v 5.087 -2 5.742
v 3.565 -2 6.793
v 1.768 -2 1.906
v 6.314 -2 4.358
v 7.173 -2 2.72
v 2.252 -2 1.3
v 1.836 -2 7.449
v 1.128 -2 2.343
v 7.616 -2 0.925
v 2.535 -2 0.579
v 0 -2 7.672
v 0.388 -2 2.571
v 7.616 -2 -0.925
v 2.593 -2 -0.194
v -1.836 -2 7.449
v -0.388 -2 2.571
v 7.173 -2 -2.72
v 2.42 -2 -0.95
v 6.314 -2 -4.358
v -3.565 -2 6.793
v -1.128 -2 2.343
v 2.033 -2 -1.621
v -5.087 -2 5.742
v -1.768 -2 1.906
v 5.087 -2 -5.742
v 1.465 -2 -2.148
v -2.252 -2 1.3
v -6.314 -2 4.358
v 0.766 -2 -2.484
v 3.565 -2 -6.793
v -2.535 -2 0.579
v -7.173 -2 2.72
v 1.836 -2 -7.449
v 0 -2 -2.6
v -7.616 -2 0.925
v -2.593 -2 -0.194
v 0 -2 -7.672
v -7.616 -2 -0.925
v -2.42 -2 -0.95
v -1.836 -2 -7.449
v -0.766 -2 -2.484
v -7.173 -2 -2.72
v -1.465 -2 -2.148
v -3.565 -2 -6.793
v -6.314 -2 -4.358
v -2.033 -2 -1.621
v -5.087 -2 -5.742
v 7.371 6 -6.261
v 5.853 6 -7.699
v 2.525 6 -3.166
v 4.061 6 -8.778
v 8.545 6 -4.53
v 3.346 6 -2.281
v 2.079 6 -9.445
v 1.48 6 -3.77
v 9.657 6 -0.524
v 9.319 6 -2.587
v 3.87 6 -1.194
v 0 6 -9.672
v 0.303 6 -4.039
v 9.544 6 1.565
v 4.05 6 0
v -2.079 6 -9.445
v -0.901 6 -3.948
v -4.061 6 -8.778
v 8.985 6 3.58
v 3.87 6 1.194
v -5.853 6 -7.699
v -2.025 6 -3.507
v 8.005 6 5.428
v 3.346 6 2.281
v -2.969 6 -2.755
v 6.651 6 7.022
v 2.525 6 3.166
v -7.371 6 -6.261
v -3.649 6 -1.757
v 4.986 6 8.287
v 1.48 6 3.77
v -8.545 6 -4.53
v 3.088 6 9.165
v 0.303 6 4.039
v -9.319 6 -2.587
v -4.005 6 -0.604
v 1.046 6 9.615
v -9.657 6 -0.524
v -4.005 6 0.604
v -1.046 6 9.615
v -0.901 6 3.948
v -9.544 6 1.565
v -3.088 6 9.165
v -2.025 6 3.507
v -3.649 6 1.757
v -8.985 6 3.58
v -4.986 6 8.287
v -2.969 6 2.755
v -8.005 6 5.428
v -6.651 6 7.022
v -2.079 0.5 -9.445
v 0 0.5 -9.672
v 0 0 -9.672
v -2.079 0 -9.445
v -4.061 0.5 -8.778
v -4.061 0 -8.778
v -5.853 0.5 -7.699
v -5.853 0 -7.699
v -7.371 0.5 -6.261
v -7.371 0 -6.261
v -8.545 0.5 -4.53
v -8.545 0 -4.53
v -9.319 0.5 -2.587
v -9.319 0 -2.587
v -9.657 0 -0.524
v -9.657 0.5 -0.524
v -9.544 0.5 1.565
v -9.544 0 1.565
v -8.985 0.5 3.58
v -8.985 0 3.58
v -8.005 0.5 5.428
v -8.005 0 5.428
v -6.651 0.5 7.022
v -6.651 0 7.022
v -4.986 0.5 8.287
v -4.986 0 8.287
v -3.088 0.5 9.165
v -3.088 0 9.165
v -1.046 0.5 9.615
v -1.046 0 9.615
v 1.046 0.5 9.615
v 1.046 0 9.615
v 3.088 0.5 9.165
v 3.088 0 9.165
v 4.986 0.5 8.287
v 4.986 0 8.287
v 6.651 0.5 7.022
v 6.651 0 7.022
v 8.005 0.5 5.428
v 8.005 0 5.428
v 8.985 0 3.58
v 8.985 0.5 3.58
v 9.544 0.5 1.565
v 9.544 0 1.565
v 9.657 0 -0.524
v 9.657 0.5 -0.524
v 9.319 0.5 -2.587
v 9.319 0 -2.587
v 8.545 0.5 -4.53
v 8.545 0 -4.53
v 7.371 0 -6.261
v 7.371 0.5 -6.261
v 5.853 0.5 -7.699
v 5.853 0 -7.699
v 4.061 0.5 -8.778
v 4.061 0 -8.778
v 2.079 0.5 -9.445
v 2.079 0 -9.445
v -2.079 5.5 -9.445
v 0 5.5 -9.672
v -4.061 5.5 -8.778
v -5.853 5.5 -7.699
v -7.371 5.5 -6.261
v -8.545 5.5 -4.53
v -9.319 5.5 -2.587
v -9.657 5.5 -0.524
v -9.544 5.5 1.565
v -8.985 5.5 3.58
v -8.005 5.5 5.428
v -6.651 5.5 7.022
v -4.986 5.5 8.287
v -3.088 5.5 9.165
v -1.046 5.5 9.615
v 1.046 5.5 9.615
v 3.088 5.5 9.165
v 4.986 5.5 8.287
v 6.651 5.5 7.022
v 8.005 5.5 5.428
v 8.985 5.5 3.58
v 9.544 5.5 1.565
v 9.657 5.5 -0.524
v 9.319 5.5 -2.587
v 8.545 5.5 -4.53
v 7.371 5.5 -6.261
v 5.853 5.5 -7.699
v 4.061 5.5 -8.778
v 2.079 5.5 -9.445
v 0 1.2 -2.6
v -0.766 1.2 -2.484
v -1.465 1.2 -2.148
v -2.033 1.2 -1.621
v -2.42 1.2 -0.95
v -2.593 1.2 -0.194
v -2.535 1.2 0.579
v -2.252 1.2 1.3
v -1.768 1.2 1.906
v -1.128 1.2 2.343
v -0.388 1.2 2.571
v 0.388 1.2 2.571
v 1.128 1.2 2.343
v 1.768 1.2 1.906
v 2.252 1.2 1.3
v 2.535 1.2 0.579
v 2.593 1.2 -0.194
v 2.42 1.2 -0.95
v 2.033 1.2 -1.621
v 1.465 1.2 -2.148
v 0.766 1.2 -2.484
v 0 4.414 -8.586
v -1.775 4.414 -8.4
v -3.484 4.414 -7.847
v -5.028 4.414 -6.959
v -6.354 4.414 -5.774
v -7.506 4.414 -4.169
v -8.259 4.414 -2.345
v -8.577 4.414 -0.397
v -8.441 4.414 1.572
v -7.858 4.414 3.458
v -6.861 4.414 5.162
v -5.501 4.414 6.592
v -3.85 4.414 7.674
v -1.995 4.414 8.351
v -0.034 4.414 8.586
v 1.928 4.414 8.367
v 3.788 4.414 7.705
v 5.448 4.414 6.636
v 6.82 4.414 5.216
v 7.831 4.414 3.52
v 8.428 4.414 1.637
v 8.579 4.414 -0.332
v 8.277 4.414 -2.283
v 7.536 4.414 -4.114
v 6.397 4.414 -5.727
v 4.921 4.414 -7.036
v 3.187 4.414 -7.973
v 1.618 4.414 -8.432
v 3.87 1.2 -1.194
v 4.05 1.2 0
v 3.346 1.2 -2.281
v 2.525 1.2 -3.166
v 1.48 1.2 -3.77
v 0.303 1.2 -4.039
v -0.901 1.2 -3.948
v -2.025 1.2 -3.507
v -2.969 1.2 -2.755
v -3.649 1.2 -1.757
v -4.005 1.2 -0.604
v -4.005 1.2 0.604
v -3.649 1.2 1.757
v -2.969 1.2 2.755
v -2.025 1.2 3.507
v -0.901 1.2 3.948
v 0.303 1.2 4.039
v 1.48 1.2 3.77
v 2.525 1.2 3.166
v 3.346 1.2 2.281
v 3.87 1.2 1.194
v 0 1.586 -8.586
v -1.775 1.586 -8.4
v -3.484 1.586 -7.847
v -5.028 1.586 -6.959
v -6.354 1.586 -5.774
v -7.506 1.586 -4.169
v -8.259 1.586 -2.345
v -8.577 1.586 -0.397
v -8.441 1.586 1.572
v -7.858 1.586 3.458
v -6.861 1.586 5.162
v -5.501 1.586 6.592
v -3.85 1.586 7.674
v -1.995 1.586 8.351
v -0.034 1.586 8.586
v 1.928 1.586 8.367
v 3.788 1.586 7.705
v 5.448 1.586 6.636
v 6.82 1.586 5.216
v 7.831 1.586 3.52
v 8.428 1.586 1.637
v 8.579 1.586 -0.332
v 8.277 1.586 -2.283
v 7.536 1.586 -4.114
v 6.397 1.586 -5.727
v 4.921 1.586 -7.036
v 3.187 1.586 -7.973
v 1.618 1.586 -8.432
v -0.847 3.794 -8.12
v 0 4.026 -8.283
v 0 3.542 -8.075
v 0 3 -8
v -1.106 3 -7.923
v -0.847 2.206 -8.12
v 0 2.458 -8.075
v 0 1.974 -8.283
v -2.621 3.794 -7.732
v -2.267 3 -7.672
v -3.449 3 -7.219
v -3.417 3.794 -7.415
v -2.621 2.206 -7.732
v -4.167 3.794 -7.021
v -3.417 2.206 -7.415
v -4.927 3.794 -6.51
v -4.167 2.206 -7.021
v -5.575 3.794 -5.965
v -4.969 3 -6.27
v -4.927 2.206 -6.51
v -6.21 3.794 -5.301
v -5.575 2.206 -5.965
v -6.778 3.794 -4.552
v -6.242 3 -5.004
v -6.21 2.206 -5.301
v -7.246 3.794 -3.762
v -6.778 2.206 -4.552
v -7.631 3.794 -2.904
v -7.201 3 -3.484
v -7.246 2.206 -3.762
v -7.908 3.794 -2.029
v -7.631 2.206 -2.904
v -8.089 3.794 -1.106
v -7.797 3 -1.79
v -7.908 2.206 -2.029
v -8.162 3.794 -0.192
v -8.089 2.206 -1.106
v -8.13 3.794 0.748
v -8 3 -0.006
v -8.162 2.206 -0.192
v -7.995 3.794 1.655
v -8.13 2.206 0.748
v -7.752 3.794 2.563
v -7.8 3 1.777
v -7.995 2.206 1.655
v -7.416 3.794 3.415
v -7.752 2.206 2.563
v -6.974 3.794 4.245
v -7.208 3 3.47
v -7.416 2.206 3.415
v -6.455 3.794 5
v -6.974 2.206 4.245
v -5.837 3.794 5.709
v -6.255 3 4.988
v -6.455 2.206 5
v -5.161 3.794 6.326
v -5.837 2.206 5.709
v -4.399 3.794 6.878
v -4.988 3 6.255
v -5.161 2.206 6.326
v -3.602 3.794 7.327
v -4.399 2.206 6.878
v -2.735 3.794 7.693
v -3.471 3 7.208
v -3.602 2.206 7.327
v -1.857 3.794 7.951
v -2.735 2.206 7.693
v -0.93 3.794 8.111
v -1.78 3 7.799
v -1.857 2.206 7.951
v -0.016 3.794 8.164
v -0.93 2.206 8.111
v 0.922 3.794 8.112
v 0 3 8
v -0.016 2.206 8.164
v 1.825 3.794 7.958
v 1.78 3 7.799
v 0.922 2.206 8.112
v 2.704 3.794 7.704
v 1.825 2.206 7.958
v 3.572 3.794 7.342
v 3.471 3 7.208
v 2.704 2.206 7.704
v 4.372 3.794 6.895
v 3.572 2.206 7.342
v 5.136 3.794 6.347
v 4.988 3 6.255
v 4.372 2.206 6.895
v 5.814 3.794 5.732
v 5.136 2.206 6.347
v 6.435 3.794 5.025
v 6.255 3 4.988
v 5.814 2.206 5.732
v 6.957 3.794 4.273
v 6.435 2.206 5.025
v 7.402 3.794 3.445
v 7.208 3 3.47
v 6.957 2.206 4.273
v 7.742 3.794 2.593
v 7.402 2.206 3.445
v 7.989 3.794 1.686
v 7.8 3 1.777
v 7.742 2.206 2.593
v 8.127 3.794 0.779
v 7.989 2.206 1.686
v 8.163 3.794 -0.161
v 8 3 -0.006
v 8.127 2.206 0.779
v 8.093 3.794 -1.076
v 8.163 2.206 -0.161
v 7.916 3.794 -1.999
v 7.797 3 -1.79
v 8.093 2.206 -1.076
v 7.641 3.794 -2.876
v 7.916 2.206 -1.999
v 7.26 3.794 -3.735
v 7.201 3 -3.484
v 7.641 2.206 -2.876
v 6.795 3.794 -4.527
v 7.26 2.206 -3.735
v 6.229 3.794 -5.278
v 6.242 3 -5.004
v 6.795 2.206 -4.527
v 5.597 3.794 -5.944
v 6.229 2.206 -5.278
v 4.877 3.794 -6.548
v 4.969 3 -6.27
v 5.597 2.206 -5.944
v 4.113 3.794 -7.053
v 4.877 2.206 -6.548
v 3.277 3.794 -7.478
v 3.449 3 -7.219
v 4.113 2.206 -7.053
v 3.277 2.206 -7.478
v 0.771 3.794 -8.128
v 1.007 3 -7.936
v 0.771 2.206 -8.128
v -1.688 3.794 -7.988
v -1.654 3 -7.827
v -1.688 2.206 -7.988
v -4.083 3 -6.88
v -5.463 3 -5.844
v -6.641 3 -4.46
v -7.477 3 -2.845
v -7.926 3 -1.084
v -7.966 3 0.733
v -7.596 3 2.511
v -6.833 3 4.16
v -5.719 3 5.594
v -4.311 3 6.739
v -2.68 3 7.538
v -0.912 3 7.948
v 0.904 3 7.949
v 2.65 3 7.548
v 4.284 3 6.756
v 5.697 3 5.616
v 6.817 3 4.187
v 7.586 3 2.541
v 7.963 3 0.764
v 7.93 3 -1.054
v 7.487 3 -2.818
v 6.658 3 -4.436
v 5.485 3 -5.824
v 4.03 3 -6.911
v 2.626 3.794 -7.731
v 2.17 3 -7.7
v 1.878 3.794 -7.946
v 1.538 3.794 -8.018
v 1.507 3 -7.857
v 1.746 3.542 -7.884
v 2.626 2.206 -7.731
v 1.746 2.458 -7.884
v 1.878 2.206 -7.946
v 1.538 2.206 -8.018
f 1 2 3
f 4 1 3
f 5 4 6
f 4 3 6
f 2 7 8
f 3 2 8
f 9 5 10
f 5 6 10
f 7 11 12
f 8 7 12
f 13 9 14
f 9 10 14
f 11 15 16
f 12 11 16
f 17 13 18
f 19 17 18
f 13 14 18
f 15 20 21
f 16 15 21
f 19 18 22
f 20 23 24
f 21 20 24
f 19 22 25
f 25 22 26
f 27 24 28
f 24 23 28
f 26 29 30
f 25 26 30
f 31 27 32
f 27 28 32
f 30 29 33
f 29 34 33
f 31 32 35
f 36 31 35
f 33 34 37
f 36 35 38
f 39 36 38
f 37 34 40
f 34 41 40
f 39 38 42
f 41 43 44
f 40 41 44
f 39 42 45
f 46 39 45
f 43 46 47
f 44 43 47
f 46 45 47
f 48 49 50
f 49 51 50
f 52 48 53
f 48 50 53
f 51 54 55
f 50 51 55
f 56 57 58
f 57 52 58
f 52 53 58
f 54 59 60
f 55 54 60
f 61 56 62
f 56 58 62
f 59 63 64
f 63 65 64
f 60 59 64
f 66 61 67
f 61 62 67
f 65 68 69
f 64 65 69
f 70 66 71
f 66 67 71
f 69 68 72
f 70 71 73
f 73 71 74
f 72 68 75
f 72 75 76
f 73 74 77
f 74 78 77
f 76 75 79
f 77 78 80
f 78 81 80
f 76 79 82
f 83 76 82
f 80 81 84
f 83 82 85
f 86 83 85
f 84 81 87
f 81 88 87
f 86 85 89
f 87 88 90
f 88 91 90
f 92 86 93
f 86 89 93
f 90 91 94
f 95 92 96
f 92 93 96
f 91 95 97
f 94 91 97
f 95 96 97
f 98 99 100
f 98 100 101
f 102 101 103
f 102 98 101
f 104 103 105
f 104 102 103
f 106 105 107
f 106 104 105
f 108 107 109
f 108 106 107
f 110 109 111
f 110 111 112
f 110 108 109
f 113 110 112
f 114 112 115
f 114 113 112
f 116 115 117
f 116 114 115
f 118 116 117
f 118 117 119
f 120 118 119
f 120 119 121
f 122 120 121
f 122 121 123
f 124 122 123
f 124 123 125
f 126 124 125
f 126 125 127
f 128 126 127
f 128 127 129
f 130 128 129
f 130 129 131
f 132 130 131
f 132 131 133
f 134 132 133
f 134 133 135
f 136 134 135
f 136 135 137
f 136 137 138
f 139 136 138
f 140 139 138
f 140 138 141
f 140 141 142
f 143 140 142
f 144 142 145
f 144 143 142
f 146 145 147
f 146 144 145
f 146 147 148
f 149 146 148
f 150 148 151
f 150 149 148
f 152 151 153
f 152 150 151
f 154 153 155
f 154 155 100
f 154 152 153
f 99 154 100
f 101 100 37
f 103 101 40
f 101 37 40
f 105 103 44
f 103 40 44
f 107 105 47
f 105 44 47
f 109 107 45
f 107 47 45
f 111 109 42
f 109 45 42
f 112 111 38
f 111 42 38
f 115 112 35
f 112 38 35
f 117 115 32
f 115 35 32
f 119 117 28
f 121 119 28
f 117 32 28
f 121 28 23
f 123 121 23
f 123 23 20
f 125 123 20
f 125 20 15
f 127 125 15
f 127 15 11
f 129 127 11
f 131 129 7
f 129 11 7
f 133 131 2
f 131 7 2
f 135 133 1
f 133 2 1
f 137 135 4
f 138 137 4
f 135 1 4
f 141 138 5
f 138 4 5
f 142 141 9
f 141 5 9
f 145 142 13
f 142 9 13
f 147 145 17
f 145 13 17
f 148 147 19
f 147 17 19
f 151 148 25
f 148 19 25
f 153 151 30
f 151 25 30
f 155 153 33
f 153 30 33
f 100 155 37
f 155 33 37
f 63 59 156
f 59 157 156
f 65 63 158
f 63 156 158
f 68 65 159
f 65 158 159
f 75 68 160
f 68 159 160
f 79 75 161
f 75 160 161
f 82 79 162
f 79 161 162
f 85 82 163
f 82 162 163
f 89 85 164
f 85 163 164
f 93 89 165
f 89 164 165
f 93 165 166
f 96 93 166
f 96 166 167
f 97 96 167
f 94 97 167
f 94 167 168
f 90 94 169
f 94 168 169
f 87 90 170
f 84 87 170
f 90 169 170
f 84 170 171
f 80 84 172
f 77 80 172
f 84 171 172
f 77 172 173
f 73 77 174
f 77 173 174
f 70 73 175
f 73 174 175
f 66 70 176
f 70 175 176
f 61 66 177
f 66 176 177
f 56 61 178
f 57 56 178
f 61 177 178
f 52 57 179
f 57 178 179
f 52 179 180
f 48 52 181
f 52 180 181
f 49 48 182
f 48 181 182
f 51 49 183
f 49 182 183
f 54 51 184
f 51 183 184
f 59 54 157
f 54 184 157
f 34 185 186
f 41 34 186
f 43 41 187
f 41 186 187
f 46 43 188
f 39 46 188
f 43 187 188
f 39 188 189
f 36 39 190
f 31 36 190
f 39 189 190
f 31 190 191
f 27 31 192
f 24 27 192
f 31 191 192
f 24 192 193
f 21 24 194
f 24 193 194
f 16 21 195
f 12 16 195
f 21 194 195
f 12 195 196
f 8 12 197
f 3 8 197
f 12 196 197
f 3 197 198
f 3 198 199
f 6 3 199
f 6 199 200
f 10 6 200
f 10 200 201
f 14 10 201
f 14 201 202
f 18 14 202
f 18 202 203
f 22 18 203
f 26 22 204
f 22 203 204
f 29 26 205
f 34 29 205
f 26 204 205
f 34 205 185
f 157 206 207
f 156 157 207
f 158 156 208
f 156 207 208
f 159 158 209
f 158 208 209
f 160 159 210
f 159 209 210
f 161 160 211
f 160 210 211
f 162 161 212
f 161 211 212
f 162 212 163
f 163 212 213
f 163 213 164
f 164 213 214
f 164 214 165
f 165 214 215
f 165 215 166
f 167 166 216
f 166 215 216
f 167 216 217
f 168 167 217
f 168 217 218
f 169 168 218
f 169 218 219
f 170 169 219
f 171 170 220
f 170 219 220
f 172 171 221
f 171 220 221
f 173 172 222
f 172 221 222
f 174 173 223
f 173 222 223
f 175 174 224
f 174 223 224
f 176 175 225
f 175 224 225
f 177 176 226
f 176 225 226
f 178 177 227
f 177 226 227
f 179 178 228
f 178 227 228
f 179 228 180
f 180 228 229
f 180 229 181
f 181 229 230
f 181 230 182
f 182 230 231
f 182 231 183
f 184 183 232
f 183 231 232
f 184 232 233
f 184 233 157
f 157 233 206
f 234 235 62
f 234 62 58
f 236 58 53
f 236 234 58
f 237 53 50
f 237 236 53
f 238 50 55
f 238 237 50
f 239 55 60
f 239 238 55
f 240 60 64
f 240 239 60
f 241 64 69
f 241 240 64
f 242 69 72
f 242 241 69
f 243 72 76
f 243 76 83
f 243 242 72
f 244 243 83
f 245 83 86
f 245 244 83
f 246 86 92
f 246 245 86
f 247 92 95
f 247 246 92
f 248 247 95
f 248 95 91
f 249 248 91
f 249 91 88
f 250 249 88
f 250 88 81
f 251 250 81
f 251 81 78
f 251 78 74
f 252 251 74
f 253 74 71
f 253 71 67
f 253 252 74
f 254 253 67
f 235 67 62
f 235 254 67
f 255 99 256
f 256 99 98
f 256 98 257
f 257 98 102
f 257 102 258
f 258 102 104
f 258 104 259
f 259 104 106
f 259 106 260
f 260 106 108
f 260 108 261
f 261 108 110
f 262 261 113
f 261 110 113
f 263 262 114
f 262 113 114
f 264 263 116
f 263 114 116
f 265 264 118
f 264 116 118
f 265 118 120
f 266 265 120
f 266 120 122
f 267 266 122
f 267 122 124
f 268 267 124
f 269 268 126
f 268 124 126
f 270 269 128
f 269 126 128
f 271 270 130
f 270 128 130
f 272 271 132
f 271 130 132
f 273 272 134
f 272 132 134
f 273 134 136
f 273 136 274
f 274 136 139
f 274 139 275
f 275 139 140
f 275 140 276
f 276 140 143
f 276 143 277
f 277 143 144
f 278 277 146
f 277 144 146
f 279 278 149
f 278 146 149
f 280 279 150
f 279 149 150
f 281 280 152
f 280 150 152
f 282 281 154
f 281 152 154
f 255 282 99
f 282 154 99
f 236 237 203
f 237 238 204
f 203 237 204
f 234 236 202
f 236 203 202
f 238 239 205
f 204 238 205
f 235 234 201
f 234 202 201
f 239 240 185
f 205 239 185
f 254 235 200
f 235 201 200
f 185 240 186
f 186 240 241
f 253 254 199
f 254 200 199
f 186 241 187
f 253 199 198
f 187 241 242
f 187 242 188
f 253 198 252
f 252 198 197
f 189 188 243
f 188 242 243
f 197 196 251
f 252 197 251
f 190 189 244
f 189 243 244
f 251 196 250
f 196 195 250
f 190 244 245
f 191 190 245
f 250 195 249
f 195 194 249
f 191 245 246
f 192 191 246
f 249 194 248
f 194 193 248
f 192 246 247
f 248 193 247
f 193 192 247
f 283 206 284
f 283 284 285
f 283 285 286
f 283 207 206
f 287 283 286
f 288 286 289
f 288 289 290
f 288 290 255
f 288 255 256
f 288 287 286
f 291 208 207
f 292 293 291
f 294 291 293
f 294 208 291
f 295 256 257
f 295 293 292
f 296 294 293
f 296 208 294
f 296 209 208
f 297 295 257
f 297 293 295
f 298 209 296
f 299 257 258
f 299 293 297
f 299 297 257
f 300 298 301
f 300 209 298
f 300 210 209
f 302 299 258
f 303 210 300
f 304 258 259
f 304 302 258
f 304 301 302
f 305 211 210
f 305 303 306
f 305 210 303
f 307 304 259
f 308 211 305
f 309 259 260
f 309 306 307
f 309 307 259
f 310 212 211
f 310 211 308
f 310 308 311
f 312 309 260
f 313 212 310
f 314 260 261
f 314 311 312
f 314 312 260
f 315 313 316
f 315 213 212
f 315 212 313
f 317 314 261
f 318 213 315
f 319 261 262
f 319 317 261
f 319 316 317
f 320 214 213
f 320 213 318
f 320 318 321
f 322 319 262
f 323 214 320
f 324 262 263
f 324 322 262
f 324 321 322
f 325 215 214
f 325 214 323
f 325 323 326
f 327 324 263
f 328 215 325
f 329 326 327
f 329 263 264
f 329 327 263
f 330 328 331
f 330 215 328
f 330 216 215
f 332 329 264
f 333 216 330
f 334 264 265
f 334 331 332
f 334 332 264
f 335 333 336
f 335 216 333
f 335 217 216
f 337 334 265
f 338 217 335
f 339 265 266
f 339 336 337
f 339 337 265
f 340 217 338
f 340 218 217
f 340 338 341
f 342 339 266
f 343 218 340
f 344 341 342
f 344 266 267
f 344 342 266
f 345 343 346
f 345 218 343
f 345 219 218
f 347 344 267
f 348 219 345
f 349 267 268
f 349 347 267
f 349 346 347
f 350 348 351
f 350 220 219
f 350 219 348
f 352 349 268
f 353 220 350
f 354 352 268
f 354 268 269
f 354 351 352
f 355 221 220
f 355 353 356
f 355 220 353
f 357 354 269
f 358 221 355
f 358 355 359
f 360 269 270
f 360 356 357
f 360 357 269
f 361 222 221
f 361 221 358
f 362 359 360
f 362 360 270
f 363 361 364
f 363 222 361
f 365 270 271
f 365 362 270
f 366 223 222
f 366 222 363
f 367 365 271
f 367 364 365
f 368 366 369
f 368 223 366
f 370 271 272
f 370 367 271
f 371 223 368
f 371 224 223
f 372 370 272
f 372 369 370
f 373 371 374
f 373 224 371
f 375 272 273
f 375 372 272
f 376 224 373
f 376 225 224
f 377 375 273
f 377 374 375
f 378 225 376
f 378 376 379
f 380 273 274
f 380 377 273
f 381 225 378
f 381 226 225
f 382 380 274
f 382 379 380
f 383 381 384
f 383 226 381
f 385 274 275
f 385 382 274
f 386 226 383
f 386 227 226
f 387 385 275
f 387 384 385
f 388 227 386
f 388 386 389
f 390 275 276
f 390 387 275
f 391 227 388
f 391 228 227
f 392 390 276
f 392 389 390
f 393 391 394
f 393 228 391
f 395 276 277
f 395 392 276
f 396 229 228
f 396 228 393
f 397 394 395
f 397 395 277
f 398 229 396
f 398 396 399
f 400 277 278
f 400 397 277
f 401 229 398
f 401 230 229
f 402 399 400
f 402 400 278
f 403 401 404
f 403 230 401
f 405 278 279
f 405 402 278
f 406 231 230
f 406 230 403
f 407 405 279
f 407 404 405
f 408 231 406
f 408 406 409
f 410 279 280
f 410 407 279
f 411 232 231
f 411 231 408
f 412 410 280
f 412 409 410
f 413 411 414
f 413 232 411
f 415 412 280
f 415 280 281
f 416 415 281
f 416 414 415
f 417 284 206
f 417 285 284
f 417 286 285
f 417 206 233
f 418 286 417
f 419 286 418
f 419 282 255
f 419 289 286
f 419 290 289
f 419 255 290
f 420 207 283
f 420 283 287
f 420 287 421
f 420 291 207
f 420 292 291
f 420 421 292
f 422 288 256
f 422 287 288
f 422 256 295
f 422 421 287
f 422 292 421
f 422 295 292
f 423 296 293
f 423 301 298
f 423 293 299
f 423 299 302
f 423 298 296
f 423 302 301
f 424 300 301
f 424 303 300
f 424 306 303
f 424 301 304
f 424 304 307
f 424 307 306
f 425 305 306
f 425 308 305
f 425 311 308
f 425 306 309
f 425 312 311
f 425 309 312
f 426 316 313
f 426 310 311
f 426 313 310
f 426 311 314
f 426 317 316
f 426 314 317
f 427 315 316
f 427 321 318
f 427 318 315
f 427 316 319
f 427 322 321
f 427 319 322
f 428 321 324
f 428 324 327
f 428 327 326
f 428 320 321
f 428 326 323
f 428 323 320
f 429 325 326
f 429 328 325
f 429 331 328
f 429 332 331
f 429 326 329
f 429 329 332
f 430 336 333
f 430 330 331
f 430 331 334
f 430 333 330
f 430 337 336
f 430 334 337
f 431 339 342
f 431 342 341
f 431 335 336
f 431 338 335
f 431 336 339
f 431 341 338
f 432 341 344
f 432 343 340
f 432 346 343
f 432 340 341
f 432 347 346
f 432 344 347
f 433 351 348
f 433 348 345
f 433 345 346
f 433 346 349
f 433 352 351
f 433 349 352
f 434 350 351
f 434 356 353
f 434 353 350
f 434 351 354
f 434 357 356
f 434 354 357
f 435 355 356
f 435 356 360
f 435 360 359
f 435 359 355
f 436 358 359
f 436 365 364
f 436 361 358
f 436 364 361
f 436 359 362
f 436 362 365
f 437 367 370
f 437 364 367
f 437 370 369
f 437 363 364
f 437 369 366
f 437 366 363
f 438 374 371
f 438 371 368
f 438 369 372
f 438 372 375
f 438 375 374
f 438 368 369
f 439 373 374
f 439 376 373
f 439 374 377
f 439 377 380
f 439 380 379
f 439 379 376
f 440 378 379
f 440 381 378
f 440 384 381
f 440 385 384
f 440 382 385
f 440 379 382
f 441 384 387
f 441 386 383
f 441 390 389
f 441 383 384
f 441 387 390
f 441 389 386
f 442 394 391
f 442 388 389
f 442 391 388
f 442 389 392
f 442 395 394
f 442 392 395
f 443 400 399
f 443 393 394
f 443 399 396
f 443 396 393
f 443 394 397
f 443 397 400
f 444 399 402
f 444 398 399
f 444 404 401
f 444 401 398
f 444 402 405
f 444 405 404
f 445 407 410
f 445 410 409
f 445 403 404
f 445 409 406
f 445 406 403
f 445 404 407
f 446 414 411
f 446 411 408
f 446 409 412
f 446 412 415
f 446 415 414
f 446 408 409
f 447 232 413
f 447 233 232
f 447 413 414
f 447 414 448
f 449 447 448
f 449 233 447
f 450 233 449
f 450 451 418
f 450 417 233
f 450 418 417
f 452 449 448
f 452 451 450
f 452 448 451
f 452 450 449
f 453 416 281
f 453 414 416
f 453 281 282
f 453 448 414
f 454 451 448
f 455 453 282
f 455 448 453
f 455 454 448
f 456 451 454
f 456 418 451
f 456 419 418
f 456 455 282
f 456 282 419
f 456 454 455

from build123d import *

# Parameters (mm, degrees)
FILLET1_R              = 2
MOVE_FACE1_BY          = 2
MOVE_FACE4_BY          = 1.8
MOVE_START             = 1.2
MOVE_FACE3_OUTLINE_R   = 4.05
MOVE_FACE3_OUTLINE_R_2 = 4
MOVE_FACE3_DEPTH       = 4.8
CHAMFER1_SIZE          = 2


# Read off the part's stored shape, not the designer's step: Move Face3
with BuildPart() as part:
    # Sketch2 → Revolve1 (revolve)
    with BuildSketch(Plane.XY, mode=Mode.PRIVATE) as revolve1_sk:
        Polygon((2.6, 0), (2.6, 3), (4, 3), (4, 6), (9.671572875, 6), (9.671572875, 5.5), (7.171572875, 3), (9.671572875, 0.5), (9.671572875, 0), align=None)
    revolve(revolve1_sk.sketch.rotate(Axis((0, 0, 0), (0, 1, 0)), 90), axis=Axis((0, 0, 0), (0, 1, 0)))

    # Fillet1
    fillet1_edges = [part.edges().sort_by_distance(p)[0] for p in [
        (0, 3, 7.171572875),
    ]]
    fillet(fillet1_edges, radius=FILLET1_R)

    # Move Face1: a face moved outward by 2.0
    extrude(part.faces().sort_by_distance((4.835786438, 0, 0))[0], amount=MOVE_FACE1_BY, dir=(0, -1, 0))

    # Move Face4: a face moved inward by 1.8
    extrude(part.faces().sort_by_distance((3.2, 3, 0))[0], amount=MOVE_FACE4_BY, dir=(0, -1, 0), mode=Mode.SUBTRACT)

    # Move Face3 outline → Move Face3 (cut)
    with BuildSketch(Plane(origin=(0, 0, 0), x_dir=(1, 0, 0), z_dir=(0, 1, 0)).offset(MOVE_START)):
        Circle(MOVE_FACE3_OUTLINE_R)
        Circle(MOVE_FACE3_OUTLINE_R_2, mode=Mode.SUBTRACT)
    extrude(amount=MOVE_FACE3_DEPTH, mode=Mode.SUBTRACT)

    # Chamfer1
    chamfer1_edges = [part.edges().sort_by_distance(p)[0] for p in [
        (0, -2, 9.671572875),
    ]]
    chamfer(chamfer1_edges, length=CHAMFER1_SIZE - 0.0001)  # a hair under: the kernel refuses the full size


solid = part.part
